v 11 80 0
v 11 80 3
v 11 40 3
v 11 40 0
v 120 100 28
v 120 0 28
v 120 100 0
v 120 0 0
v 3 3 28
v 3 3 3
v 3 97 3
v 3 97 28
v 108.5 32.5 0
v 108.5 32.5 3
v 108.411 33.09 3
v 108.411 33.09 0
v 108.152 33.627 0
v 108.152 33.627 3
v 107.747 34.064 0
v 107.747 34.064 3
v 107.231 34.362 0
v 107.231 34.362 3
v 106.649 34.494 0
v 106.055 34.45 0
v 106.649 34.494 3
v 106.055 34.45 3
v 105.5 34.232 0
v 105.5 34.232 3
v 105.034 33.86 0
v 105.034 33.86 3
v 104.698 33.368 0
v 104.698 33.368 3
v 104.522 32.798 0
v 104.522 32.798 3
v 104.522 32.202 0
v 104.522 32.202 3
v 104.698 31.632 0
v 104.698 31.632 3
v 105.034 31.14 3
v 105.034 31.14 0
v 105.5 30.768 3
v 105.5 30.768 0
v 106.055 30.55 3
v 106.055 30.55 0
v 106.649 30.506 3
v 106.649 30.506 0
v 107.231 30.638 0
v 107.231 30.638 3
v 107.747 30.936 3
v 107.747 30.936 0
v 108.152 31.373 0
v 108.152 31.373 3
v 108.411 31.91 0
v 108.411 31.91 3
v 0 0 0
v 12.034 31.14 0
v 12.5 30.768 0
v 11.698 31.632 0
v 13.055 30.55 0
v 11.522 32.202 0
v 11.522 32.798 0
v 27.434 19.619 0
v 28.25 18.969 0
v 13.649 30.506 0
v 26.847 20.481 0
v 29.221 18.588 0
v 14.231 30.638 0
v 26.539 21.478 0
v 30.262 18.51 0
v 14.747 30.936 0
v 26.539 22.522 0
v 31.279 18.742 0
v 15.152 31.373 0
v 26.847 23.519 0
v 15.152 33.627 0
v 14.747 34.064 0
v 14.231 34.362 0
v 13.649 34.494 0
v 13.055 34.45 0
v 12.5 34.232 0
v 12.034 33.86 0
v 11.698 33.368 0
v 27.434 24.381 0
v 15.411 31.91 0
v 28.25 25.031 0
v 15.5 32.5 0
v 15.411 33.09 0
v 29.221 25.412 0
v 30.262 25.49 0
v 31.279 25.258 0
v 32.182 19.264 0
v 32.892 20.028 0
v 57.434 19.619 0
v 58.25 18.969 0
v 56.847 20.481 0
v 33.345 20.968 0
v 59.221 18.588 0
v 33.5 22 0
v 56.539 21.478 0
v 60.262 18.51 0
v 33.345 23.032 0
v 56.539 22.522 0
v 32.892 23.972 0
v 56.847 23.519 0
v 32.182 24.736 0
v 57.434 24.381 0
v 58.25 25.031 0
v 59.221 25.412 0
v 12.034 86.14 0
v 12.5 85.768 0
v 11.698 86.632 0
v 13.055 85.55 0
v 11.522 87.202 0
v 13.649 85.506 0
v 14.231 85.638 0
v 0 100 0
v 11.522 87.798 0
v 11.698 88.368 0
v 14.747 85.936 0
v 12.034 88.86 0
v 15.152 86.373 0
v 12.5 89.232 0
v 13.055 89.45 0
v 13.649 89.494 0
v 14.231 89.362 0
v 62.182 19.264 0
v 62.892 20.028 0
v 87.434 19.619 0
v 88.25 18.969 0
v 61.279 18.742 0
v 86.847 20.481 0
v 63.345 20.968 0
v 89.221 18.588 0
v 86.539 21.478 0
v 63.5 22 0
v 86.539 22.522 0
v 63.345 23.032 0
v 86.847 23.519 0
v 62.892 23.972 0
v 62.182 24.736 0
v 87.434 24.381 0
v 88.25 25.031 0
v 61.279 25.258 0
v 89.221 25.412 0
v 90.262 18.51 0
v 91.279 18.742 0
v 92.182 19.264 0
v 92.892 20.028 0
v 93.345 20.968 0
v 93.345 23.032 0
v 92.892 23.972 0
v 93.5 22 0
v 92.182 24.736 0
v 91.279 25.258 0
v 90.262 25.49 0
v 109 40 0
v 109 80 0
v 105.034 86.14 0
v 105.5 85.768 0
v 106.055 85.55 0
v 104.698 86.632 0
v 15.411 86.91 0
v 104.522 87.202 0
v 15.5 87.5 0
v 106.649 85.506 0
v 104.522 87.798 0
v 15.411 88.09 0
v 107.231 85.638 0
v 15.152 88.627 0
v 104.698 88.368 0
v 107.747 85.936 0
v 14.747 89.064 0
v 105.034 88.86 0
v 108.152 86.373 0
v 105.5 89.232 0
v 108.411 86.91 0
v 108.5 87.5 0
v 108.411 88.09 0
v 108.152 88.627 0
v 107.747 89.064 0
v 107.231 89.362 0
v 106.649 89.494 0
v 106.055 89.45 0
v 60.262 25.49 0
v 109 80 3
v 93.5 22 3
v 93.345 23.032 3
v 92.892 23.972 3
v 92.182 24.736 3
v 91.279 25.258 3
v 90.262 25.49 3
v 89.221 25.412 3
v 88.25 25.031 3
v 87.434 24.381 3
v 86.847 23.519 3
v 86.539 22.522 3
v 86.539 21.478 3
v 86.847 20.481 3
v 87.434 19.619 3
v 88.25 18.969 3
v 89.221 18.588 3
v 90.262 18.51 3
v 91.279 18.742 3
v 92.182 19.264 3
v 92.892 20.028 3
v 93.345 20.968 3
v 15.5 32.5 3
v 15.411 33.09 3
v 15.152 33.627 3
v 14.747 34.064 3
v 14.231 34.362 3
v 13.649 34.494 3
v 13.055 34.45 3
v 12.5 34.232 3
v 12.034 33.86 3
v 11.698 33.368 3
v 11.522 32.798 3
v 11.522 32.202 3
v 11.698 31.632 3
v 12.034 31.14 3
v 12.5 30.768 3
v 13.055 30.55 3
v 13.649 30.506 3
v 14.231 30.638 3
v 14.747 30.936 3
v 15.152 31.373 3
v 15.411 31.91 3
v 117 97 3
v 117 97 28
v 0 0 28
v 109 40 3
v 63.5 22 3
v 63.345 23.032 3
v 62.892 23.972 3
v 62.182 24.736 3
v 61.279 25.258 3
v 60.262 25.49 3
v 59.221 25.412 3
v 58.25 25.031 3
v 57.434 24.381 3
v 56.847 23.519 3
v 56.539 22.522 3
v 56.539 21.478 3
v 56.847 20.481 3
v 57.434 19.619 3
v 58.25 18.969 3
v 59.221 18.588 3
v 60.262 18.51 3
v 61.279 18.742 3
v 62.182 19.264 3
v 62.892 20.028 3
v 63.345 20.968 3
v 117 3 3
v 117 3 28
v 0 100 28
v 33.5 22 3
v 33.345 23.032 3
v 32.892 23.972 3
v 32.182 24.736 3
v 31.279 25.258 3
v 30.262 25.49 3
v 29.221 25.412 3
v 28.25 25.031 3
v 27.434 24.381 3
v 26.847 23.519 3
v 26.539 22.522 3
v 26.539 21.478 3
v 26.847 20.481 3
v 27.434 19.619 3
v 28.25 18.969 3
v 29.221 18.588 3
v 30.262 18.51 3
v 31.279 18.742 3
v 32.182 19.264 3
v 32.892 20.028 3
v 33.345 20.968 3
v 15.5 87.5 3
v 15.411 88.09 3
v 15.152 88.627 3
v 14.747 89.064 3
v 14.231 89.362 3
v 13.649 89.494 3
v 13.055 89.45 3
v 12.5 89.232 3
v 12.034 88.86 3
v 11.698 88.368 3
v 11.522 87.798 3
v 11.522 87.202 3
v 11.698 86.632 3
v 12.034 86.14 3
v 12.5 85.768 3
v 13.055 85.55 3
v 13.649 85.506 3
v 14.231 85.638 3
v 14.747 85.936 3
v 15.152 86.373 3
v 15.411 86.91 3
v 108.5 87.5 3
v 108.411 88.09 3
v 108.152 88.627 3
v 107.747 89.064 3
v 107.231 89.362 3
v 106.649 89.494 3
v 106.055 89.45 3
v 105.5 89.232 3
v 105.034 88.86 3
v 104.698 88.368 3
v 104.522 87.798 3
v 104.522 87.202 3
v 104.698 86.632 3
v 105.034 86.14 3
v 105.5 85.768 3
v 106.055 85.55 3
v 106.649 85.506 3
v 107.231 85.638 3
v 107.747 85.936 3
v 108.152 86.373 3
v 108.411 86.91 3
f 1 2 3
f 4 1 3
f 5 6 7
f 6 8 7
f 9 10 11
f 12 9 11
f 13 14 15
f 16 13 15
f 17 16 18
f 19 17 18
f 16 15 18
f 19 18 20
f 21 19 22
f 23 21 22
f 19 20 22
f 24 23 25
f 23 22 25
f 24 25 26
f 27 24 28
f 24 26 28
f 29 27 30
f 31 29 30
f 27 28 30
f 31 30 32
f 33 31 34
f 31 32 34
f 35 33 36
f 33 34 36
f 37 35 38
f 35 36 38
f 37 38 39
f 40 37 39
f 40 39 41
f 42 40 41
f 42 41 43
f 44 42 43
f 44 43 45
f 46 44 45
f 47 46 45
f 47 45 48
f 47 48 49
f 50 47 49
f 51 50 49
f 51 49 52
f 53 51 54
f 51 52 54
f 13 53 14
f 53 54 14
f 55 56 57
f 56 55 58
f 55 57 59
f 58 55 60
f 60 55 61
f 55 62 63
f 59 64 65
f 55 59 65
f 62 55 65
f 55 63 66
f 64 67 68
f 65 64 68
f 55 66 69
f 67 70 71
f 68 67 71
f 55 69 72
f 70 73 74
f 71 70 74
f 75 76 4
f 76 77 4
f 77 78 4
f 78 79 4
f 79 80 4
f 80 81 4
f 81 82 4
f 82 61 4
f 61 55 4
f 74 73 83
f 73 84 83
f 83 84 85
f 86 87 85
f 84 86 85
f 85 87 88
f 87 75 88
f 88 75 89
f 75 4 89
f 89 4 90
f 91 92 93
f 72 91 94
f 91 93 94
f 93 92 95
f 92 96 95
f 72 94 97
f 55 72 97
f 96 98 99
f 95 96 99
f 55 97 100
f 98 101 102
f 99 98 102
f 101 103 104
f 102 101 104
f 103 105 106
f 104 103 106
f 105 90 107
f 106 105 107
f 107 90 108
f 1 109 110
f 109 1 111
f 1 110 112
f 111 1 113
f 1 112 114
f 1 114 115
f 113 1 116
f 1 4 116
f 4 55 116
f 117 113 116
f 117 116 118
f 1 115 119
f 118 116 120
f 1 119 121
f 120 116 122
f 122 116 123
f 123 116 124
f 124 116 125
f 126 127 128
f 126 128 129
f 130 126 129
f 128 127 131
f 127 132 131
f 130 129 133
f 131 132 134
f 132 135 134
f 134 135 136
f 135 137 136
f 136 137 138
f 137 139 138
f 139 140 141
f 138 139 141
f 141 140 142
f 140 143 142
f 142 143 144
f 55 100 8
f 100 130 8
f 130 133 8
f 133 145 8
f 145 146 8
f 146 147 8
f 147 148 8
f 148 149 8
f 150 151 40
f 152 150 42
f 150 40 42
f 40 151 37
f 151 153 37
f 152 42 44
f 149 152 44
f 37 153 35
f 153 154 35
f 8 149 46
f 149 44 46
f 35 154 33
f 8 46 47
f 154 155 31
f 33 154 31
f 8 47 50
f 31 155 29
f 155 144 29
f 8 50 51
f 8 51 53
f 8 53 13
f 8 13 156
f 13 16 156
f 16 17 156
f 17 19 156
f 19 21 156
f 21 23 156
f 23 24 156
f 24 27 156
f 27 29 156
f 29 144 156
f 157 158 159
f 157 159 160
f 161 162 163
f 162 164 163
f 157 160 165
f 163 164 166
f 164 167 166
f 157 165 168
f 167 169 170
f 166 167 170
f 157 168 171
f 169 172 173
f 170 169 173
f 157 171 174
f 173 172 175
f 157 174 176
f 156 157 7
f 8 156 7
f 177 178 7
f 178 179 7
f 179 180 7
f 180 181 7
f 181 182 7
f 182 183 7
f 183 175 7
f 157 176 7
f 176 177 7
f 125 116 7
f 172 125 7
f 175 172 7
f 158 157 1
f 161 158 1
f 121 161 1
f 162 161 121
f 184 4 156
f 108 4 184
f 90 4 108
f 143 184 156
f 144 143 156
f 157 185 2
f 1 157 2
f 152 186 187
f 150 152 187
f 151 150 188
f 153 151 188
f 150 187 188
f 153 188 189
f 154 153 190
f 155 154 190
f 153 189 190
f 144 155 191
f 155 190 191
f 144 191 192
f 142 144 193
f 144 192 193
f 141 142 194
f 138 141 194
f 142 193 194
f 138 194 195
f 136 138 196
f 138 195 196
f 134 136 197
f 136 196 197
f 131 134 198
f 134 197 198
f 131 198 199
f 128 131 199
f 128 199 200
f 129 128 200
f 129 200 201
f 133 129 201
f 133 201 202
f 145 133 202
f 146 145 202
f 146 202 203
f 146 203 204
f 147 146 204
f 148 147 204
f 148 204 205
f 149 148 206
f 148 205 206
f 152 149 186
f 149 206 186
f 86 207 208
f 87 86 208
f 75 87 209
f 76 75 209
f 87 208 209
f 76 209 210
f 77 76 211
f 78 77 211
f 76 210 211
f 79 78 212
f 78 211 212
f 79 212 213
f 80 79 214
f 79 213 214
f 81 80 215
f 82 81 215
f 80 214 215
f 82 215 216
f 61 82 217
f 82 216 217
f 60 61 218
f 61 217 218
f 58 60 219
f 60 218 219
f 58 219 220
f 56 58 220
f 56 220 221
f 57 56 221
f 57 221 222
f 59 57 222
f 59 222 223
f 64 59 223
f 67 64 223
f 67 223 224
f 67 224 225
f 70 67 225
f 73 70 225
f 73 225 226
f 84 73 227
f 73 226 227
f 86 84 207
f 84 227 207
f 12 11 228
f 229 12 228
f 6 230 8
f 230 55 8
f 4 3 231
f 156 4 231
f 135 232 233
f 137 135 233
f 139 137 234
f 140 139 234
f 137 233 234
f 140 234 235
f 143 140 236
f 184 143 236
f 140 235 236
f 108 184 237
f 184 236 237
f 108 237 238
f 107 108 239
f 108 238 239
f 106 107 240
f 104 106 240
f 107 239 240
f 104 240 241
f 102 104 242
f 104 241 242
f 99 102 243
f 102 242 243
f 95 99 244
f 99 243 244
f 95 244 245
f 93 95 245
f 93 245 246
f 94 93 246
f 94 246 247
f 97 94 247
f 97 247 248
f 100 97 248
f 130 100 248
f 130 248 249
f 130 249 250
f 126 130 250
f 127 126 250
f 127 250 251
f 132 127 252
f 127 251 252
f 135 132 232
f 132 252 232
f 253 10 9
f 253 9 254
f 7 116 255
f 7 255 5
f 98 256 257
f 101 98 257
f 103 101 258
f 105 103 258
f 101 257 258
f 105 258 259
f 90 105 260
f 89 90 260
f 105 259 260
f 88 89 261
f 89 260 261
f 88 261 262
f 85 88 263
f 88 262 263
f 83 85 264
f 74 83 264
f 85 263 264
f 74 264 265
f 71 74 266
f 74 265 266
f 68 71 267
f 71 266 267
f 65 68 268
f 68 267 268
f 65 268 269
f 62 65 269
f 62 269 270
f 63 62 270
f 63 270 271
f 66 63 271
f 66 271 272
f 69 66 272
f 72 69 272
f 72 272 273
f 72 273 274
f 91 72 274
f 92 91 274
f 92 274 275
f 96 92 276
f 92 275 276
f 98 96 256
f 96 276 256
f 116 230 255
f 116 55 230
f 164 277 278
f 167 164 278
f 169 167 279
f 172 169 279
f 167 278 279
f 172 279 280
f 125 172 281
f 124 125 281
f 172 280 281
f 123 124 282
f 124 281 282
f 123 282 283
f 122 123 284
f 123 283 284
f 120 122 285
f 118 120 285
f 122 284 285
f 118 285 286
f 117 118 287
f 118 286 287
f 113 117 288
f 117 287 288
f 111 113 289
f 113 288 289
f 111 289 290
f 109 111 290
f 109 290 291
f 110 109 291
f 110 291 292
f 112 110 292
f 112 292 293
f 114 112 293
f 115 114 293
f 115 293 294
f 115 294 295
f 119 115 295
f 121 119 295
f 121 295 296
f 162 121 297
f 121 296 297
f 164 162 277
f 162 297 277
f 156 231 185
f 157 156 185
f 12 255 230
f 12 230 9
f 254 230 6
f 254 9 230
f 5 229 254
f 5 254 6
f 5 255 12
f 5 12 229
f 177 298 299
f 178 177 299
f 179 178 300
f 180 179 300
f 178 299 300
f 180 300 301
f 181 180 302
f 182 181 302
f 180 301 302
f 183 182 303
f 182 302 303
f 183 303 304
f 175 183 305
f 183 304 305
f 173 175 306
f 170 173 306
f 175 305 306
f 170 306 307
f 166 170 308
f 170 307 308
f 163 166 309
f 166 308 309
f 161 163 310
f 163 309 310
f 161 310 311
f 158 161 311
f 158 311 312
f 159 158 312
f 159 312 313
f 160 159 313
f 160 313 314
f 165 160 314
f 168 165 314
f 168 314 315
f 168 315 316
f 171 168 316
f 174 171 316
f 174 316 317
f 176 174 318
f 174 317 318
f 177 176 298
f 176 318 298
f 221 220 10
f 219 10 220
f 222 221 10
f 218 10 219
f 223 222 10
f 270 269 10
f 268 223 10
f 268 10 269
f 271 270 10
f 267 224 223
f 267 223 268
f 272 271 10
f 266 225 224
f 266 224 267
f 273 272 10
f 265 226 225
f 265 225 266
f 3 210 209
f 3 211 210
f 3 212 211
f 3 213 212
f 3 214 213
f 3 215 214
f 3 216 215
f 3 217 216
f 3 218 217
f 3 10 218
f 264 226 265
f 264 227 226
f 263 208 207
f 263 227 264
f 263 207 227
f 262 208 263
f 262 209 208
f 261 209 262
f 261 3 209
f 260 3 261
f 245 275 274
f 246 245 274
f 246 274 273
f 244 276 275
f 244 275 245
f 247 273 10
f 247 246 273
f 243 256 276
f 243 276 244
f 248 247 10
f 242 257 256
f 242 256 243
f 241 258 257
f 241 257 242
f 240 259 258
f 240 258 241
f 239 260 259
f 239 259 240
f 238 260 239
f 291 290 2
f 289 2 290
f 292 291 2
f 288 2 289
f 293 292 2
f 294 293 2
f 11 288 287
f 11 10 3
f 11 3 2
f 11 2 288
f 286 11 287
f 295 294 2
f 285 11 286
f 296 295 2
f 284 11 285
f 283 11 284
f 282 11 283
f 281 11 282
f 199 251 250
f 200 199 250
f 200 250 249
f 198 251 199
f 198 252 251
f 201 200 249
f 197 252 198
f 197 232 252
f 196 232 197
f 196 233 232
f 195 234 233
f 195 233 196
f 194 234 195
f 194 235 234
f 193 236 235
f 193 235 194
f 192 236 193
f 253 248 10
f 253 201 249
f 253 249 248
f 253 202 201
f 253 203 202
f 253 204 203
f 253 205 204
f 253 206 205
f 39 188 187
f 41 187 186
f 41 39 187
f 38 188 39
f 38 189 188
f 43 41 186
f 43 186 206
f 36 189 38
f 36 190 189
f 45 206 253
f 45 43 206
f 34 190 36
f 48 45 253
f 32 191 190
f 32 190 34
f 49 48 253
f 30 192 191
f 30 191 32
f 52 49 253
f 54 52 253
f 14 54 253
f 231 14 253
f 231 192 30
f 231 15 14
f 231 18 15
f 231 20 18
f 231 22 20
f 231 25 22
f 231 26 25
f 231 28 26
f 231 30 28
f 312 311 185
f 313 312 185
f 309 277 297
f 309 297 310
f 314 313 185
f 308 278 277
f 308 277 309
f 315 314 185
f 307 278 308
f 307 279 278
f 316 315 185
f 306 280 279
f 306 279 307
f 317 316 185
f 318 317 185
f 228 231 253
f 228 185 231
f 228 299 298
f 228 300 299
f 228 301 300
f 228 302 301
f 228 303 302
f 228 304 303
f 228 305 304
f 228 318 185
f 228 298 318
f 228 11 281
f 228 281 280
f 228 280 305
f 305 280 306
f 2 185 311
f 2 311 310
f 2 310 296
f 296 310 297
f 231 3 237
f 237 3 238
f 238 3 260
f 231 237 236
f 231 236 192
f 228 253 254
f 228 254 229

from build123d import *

# Parameters (mm, degrees)
CROQUIS1_W              = 120
CROQUIS1_H              = 100
SALIENTE_EXTRUIR1_DEPTH = 3
CROQUIS2_R              = 2
CROQUIS2_R_2            = 3.5
CORTAR_EXTRUIR1_DEPTH   = 3
CROQUIS3_W              = 120
CROQUIS3_H              = 100
CROQUIS3_W_2            = 114
CROQUIS3_H_2            = 94
SALIENTE_EXTRUIR2_DEPTH = 25


with BuildPart() as part:
    # Croquis1 → Saliente-Extruir1 (new body)
    with BuildSketch(Plane.XY):
        with Locations((60, 50)):
            Rectangle(CROQUIS1_W, CROQUIS1_H)
    extrude(amount=SALIENTE_EXTRUIR1_DEPTH)

    # Croquis2 → Cortar-Extruir1 (cut)
    with BuildSketch(Plane.XY.offset(3)):
        Polygon((11, 80), (11, 60), (11, 40), (109, 40), (109, 80), align=None)
        with Locations((13.5, 87.5)):
            Circle(CROQUIS2_R)
        with Locations((106.5, 87.5)):
            Circle(CROQUIS2_R)
        with Locations((106.5, 32.5)):
            Circle(CROQUIS2_R)
        with Locations((13.5, 32.5)):
            Circle(CROQUIS2_R)
        with Locations((30, 22)):
            Circle(CROQUIS2_R_2)
        with Locations((60, 22)):
            Circle(CROQUIS2_R_2)
        with Locations((90, 22)):
            Circle(CROQUIS2_R_2)
    extrude(amount=-CORTAR_EXTRUIR1_DEPTH, mode=Mode.SUBTRACT)

    # Croquis3 → Saliente-Extruir2 (add)
    with BuildSketch(Plane.XY.offset(3)):
        with Locations((60, 50)):
            Rectangle(CROQUIS3_W, CROQUIS3_H)
        with Locations((60, 50)):
            Rectangle(CROQUIS3_W_2, CROQUIS3_H_2, mode=Mode.SUBTRACT)
    extrude(amount=SALIENTE_EXTRUIR2_DEPTH)


solid = part.part
